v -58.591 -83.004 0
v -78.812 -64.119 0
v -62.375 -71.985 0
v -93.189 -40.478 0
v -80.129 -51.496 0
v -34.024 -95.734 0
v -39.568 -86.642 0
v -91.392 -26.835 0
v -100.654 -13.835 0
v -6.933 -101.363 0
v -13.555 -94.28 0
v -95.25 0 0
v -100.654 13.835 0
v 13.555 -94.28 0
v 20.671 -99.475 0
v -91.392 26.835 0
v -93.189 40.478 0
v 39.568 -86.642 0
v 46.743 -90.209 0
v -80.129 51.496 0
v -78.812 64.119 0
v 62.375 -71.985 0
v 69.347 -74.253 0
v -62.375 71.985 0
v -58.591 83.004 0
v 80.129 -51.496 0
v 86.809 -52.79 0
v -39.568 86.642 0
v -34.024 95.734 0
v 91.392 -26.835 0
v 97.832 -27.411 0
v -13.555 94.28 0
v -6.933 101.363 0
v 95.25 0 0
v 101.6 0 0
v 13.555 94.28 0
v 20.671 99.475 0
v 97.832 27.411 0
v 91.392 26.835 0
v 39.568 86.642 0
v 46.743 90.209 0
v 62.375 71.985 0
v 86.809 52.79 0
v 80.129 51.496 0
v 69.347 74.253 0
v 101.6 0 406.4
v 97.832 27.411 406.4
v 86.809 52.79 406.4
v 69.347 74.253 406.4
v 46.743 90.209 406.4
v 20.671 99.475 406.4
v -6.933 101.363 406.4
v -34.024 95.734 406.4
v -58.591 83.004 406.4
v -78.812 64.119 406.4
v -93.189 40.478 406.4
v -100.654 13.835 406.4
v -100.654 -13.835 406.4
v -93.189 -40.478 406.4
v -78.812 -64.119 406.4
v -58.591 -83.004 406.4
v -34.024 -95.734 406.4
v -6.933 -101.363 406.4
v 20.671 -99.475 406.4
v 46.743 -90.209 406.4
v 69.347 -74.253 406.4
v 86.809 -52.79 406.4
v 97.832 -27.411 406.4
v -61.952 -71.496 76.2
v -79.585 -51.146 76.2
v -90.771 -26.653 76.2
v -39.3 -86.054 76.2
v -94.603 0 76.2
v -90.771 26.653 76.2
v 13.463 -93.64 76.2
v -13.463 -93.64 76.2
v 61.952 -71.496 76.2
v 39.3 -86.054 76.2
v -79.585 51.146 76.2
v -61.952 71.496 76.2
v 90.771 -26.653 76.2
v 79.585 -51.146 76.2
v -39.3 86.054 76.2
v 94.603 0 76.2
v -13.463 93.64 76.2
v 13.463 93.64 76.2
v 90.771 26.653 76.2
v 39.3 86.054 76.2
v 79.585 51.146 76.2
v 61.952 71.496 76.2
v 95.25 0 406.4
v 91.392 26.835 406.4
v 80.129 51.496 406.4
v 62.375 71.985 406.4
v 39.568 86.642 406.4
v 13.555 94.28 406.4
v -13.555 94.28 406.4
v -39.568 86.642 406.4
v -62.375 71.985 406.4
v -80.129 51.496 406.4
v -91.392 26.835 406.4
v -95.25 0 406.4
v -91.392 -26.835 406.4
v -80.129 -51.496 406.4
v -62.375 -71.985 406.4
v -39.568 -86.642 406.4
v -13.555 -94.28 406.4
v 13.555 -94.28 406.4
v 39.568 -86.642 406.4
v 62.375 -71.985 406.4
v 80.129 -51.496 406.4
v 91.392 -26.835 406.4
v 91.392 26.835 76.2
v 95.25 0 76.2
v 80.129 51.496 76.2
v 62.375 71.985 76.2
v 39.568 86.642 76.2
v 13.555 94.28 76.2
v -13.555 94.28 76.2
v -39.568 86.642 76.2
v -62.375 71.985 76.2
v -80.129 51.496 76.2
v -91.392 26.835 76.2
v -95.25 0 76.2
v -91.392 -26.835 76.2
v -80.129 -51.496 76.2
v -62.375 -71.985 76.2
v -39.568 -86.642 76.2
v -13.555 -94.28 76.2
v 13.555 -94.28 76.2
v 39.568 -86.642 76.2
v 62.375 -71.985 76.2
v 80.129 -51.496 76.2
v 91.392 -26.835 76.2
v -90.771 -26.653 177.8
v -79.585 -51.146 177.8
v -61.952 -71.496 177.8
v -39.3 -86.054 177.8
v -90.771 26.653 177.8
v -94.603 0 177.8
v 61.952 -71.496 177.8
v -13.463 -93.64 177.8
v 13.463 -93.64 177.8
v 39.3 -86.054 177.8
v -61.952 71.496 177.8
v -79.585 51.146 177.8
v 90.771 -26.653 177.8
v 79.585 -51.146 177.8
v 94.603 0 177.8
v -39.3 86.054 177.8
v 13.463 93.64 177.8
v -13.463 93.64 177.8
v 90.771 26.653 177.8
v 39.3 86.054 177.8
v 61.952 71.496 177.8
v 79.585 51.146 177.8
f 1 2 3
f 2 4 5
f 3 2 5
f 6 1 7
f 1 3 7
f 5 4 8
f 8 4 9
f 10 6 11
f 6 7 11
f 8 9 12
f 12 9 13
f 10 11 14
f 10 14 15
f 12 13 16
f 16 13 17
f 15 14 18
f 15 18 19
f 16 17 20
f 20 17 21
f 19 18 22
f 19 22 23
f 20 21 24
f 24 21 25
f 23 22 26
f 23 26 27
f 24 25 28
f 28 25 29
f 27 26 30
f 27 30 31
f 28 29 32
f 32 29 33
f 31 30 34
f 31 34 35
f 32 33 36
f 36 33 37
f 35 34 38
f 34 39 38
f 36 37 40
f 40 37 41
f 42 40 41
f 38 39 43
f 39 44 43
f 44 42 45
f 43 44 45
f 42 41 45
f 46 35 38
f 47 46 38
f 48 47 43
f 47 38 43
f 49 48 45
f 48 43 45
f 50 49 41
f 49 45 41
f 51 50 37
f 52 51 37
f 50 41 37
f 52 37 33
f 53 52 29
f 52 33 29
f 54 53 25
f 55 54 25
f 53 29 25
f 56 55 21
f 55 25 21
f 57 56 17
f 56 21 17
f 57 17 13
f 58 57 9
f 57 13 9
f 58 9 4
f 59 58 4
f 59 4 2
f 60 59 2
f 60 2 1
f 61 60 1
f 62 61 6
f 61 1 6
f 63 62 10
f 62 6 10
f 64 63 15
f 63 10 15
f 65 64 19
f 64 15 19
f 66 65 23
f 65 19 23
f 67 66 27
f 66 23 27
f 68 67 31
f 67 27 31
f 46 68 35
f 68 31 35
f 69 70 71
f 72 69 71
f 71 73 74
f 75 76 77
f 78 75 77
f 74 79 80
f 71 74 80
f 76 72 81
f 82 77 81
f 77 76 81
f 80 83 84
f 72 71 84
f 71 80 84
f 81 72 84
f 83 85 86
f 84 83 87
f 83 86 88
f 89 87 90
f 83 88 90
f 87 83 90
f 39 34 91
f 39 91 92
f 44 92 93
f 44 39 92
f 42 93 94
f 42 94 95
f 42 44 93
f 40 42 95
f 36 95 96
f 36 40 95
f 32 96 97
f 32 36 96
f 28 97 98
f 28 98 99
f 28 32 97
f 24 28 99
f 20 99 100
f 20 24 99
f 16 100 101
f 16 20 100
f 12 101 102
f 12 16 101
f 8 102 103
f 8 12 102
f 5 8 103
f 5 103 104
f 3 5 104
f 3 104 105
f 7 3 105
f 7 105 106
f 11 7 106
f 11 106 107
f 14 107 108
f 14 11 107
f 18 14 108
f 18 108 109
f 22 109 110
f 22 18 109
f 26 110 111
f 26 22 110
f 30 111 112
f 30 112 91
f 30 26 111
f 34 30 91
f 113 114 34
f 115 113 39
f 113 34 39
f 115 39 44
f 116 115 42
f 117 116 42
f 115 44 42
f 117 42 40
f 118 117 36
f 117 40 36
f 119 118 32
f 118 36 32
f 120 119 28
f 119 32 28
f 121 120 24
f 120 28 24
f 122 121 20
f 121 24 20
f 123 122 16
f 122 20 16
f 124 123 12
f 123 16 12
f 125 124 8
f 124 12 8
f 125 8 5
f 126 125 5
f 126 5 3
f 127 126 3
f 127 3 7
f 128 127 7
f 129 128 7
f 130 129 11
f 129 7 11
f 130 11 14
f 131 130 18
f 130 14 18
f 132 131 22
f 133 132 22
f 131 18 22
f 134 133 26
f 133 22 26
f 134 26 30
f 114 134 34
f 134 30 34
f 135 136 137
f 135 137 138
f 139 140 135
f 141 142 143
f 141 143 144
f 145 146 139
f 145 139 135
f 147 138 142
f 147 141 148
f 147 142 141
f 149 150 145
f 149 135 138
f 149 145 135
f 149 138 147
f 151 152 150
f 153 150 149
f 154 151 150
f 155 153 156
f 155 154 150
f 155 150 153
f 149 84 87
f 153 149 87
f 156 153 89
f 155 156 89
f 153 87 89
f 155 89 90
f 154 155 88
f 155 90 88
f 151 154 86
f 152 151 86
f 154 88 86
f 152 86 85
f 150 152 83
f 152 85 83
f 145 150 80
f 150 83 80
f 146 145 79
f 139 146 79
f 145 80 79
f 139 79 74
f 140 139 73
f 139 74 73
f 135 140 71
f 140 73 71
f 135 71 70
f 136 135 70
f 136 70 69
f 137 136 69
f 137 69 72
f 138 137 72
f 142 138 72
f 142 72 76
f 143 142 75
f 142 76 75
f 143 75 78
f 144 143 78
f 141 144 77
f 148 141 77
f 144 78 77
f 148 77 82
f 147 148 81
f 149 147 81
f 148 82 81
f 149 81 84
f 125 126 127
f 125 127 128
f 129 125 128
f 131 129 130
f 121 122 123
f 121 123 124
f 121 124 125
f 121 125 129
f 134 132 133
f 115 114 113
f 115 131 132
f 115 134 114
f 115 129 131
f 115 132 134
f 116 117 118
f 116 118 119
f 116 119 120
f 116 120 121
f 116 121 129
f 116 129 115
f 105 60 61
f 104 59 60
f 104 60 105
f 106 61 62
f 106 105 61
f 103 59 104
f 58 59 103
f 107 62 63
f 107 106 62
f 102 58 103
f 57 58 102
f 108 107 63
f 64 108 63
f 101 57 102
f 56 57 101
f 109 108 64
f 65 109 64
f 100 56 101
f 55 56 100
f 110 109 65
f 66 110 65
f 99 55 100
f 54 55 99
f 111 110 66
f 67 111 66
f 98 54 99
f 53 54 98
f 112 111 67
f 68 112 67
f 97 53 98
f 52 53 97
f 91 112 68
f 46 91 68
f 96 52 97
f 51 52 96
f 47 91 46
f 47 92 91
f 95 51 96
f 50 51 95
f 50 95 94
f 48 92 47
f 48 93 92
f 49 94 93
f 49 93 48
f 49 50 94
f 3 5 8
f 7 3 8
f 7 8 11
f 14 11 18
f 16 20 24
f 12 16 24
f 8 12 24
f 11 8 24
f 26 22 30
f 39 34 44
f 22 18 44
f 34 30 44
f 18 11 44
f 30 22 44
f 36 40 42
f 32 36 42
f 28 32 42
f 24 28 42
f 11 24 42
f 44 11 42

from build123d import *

# Parameters (mm, degrees)
F0_R     = 101.6
F0_R_2   = 95.25
F1_DEPTH = 406.4
F2_R     = 95.25
F3_DEPTH = 76.2
F4_R     = 94.603376
F5_DEPTH = 101.6


with BuildPart() as f1:
    # F0 (on Top) → F1 (new body)
    with BuildSketch(Plane.XY):
        Circle(F0_R)
        Circle(F0_R_2, mode=Mode.SUBTRACT)
    extrude(amount=F1_DEPTH)


with BuildPart() as f3:
    # F2 (on Top) → F3 (new body)
    with BuildSketch(Plane.XY):
        Circle(F2_R)
    extrude(amount=F3_DEPTH)


with BuildPart() as f5:
    # F4 (on face) → F5 (new body)
    with BuildSketch(Plane.XY.offset(76.2)):
        Circle(F4_R)
    extrude(amount=F5_DEPTH)


solid = Compound([f1.part, f3.part, f5.part])
